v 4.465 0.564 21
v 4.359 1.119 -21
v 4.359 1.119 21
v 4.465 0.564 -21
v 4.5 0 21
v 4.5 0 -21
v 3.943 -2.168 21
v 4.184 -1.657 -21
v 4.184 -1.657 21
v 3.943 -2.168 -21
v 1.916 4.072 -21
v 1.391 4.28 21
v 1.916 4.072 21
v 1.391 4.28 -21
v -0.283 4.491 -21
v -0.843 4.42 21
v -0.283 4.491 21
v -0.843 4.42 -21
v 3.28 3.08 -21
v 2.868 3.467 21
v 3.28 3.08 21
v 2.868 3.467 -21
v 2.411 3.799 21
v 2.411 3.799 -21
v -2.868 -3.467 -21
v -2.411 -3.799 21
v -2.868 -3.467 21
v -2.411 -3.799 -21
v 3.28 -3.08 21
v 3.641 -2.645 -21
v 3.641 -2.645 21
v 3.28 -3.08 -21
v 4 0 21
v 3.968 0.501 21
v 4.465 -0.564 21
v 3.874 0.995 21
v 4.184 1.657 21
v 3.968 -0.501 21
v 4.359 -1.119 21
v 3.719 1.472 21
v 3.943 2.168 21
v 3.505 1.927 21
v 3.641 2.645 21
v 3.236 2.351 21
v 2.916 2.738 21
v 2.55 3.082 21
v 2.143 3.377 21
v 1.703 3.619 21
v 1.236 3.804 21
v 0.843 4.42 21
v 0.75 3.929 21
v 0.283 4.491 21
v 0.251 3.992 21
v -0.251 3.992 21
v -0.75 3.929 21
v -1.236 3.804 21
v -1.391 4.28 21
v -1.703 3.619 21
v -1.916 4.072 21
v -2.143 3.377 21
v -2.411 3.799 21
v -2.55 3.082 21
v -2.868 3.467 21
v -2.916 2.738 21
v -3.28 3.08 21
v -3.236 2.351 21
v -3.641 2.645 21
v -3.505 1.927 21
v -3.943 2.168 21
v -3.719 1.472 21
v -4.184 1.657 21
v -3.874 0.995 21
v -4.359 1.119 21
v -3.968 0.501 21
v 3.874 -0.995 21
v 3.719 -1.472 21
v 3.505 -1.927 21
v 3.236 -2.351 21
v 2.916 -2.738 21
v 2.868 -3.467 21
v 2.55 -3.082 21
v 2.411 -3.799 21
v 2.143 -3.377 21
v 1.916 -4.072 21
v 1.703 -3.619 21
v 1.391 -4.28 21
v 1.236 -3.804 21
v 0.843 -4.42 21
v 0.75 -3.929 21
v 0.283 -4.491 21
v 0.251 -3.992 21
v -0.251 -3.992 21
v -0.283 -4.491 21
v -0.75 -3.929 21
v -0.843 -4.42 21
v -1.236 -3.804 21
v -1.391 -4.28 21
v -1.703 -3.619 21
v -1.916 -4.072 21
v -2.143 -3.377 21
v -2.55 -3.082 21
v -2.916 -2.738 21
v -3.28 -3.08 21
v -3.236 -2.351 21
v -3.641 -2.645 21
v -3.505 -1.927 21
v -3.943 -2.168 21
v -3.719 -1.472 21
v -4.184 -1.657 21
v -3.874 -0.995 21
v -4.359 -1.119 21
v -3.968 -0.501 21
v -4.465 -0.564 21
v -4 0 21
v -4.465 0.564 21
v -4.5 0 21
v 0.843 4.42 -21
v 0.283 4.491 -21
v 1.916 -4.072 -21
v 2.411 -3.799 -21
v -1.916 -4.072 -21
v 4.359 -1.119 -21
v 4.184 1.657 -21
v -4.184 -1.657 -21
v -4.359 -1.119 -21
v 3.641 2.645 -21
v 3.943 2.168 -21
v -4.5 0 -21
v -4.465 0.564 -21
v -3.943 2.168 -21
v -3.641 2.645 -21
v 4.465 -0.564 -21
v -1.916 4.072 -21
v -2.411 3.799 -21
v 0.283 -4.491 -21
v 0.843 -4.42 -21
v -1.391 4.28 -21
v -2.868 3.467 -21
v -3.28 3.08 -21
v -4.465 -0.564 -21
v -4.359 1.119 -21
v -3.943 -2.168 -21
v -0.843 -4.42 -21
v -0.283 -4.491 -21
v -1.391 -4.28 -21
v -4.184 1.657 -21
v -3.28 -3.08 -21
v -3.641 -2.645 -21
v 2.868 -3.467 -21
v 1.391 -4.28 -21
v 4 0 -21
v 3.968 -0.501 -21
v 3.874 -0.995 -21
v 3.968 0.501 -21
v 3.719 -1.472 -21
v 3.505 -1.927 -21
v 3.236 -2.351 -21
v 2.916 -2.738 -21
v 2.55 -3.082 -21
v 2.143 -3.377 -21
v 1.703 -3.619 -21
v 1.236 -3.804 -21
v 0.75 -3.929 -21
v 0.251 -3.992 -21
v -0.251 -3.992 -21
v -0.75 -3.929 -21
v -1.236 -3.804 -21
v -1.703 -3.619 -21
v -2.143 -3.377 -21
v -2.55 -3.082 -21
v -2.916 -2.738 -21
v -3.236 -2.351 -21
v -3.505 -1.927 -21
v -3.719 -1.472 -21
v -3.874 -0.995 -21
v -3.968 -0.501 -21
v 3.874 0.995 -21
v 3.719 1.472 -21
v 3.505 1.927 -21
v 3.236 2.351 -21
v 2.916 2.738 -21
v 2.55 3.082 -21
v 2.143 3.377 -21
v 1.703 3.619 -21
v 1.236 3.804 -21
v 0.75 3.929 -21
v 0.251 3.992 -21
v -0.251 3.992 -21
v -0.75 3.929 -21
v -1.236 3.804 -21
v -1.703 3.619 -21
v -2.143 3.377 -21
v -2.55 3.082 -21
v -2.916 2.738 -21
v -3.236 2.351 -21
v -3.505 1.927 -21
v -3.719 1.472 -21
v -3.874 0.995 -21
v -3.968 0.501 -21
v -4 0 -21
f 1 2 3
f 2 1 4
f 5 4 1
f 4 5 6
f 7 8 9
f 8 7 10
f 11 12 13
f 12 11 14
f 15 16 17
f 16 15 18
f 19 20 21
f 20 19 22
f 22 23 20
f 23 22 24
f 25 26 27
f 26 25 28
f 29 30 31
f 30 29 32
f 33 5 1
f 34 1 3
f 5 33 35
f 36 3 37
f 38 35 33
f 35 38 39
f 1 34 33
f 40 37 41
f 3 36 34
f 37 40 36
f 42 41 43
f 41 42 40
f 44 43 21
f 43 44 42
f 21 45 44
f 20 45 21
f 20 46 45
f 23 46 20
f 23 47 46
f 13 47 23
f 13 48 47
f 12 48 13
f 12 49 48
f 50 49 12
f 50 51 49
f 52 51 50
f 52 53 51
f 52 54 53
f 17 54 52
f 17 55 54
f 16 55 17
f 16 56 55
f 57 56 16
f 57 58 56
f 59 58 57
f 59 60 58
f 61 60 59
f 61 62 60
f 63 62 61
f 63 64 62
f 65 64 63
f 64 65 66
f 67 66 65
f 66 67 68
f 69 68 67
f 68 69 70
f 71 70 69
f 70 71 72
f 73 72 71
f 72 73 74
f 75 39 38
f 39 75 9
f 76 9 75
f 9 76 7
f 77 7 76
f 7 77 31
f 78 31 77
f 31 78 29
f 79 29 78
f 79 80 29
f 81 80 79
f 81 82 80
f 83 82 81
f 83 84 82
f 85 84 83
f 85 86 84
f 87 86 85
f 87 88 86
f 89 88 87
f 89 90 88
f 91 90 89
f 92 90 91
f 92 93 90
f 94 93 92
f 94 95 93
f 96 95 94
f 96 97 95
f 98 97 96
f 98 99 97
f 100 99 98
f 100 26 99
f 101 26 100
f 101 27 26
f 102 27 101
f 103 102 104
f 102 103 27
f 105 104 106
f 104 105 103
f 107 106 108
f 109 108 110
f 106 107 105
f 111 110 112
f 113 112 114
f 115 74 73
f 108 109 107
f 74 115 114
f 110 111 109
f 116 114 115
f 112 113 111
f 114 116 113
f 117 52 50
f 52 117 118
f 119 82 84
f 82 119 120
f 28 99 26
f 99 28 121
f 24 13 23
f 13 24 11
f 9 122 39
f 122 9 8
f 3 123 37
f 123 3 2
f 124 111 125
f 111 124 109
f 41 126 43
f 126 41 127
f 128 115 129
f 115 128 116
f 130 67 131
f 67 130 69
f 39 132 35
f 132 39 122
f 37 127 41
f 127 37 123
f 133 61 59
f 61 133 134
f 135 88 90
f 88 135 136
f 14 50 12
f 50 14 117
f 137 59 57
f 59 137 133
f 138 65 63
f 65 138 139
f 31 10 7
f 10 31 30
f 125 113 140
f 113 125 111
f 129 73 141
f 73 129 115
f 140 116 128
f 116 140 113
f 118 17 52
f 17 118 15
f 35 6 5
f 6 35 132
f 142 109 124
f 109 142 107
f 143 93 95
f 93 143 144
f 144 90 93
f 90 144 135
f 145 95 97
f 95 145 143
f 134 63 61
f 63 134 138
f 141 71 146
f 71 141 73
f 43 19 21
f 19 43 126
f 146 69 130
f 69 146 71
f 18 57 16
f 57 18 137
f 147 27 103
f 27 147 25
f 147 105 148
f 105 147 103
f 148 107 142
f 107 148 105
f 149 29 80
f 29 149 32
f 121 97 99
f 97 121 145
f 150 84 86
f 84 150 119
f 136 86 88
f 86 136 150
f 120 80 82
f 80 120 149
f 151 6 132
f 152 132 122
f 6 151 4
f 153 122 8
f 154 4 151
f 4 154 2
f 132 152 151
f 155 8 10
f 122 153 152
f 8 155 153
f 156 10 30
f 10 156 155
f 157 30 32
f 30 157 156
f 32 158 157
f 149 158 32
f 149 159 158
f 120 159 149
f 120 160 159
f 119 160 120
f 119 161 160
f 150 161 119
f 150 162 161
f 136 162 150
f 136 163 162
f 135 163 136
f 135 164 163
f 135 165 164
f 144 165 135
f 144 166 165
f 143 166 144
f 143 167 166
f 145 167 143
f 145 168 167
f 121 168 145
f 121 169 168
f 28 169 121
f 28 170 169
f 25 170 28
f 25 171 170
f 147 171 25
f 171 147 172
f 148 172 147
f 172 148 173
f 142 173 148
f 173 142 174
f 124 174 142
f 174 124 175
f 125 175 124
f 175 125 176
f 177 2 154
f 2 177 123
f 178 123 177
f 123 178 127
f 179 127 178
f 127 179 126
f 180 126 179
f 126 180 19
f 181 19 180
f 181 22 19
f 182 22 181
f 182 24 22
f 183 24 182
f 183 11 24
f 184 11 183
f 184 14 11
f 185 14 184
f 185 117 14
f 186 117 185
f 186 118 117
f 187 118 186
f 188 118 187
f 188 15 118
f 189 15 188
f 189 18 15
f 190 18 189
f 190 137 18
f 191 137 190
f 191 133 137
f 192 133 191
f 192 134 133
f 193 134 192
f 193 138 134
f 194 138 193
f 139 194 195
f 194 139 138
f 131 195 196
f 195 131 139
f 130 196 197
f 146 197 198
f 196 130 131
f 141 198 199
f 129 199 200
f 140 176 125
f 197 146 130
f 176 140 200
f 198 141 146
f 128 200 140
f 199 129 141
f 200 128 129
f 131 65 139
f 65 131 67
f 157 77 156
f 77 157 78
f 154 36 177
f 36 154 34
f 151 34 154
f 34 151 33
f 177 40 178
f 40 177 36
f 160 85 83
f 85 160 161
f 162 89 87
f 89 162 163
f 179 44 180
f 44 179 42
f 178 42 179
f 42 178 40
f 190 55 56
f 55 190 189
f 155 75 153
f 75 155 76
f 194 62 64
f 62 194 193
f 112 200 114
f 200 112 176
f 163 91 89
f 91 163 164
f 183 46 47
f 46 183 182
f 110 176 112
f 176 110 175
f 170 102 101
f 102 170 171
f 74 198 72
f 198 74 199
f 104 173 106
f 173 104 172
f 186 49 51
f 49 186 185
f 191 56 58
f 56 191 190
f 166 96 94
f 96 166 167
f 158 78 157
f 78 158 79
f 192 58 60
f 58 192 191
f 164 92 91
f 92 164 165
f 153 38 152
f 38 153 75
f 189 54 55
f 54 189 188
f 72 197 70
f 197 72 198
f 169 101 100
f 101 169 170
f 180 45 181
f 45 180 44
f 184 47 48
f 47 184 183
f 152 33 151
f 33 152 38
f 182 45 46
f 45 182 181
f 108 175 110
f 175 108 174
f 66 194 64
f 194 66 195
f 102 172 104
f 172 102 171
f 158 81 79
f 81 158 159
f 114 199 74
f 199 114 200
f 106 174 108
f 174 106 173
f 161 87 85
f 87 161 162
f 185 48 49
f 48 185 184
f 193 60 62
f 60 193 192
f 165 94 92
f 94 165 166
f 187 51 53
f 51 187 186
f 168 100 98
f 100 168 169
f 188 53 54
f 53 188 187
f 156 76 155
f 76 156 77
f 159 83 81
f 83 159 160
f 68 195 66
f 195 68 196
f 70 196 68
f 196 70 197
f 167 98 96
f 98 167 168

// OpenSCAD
$fn = 50;


difference() {
	union() {
		translate(v = [0, 0, -21.0000000000]) {
			cylinder(h = 42, r = 4.5000000000);
		}
	}
	union() {
		translate(v = [0, 0, -100.0000000000]) {
			cylinder(h = 200, r = 4.0000000000);
		}
	}
}
